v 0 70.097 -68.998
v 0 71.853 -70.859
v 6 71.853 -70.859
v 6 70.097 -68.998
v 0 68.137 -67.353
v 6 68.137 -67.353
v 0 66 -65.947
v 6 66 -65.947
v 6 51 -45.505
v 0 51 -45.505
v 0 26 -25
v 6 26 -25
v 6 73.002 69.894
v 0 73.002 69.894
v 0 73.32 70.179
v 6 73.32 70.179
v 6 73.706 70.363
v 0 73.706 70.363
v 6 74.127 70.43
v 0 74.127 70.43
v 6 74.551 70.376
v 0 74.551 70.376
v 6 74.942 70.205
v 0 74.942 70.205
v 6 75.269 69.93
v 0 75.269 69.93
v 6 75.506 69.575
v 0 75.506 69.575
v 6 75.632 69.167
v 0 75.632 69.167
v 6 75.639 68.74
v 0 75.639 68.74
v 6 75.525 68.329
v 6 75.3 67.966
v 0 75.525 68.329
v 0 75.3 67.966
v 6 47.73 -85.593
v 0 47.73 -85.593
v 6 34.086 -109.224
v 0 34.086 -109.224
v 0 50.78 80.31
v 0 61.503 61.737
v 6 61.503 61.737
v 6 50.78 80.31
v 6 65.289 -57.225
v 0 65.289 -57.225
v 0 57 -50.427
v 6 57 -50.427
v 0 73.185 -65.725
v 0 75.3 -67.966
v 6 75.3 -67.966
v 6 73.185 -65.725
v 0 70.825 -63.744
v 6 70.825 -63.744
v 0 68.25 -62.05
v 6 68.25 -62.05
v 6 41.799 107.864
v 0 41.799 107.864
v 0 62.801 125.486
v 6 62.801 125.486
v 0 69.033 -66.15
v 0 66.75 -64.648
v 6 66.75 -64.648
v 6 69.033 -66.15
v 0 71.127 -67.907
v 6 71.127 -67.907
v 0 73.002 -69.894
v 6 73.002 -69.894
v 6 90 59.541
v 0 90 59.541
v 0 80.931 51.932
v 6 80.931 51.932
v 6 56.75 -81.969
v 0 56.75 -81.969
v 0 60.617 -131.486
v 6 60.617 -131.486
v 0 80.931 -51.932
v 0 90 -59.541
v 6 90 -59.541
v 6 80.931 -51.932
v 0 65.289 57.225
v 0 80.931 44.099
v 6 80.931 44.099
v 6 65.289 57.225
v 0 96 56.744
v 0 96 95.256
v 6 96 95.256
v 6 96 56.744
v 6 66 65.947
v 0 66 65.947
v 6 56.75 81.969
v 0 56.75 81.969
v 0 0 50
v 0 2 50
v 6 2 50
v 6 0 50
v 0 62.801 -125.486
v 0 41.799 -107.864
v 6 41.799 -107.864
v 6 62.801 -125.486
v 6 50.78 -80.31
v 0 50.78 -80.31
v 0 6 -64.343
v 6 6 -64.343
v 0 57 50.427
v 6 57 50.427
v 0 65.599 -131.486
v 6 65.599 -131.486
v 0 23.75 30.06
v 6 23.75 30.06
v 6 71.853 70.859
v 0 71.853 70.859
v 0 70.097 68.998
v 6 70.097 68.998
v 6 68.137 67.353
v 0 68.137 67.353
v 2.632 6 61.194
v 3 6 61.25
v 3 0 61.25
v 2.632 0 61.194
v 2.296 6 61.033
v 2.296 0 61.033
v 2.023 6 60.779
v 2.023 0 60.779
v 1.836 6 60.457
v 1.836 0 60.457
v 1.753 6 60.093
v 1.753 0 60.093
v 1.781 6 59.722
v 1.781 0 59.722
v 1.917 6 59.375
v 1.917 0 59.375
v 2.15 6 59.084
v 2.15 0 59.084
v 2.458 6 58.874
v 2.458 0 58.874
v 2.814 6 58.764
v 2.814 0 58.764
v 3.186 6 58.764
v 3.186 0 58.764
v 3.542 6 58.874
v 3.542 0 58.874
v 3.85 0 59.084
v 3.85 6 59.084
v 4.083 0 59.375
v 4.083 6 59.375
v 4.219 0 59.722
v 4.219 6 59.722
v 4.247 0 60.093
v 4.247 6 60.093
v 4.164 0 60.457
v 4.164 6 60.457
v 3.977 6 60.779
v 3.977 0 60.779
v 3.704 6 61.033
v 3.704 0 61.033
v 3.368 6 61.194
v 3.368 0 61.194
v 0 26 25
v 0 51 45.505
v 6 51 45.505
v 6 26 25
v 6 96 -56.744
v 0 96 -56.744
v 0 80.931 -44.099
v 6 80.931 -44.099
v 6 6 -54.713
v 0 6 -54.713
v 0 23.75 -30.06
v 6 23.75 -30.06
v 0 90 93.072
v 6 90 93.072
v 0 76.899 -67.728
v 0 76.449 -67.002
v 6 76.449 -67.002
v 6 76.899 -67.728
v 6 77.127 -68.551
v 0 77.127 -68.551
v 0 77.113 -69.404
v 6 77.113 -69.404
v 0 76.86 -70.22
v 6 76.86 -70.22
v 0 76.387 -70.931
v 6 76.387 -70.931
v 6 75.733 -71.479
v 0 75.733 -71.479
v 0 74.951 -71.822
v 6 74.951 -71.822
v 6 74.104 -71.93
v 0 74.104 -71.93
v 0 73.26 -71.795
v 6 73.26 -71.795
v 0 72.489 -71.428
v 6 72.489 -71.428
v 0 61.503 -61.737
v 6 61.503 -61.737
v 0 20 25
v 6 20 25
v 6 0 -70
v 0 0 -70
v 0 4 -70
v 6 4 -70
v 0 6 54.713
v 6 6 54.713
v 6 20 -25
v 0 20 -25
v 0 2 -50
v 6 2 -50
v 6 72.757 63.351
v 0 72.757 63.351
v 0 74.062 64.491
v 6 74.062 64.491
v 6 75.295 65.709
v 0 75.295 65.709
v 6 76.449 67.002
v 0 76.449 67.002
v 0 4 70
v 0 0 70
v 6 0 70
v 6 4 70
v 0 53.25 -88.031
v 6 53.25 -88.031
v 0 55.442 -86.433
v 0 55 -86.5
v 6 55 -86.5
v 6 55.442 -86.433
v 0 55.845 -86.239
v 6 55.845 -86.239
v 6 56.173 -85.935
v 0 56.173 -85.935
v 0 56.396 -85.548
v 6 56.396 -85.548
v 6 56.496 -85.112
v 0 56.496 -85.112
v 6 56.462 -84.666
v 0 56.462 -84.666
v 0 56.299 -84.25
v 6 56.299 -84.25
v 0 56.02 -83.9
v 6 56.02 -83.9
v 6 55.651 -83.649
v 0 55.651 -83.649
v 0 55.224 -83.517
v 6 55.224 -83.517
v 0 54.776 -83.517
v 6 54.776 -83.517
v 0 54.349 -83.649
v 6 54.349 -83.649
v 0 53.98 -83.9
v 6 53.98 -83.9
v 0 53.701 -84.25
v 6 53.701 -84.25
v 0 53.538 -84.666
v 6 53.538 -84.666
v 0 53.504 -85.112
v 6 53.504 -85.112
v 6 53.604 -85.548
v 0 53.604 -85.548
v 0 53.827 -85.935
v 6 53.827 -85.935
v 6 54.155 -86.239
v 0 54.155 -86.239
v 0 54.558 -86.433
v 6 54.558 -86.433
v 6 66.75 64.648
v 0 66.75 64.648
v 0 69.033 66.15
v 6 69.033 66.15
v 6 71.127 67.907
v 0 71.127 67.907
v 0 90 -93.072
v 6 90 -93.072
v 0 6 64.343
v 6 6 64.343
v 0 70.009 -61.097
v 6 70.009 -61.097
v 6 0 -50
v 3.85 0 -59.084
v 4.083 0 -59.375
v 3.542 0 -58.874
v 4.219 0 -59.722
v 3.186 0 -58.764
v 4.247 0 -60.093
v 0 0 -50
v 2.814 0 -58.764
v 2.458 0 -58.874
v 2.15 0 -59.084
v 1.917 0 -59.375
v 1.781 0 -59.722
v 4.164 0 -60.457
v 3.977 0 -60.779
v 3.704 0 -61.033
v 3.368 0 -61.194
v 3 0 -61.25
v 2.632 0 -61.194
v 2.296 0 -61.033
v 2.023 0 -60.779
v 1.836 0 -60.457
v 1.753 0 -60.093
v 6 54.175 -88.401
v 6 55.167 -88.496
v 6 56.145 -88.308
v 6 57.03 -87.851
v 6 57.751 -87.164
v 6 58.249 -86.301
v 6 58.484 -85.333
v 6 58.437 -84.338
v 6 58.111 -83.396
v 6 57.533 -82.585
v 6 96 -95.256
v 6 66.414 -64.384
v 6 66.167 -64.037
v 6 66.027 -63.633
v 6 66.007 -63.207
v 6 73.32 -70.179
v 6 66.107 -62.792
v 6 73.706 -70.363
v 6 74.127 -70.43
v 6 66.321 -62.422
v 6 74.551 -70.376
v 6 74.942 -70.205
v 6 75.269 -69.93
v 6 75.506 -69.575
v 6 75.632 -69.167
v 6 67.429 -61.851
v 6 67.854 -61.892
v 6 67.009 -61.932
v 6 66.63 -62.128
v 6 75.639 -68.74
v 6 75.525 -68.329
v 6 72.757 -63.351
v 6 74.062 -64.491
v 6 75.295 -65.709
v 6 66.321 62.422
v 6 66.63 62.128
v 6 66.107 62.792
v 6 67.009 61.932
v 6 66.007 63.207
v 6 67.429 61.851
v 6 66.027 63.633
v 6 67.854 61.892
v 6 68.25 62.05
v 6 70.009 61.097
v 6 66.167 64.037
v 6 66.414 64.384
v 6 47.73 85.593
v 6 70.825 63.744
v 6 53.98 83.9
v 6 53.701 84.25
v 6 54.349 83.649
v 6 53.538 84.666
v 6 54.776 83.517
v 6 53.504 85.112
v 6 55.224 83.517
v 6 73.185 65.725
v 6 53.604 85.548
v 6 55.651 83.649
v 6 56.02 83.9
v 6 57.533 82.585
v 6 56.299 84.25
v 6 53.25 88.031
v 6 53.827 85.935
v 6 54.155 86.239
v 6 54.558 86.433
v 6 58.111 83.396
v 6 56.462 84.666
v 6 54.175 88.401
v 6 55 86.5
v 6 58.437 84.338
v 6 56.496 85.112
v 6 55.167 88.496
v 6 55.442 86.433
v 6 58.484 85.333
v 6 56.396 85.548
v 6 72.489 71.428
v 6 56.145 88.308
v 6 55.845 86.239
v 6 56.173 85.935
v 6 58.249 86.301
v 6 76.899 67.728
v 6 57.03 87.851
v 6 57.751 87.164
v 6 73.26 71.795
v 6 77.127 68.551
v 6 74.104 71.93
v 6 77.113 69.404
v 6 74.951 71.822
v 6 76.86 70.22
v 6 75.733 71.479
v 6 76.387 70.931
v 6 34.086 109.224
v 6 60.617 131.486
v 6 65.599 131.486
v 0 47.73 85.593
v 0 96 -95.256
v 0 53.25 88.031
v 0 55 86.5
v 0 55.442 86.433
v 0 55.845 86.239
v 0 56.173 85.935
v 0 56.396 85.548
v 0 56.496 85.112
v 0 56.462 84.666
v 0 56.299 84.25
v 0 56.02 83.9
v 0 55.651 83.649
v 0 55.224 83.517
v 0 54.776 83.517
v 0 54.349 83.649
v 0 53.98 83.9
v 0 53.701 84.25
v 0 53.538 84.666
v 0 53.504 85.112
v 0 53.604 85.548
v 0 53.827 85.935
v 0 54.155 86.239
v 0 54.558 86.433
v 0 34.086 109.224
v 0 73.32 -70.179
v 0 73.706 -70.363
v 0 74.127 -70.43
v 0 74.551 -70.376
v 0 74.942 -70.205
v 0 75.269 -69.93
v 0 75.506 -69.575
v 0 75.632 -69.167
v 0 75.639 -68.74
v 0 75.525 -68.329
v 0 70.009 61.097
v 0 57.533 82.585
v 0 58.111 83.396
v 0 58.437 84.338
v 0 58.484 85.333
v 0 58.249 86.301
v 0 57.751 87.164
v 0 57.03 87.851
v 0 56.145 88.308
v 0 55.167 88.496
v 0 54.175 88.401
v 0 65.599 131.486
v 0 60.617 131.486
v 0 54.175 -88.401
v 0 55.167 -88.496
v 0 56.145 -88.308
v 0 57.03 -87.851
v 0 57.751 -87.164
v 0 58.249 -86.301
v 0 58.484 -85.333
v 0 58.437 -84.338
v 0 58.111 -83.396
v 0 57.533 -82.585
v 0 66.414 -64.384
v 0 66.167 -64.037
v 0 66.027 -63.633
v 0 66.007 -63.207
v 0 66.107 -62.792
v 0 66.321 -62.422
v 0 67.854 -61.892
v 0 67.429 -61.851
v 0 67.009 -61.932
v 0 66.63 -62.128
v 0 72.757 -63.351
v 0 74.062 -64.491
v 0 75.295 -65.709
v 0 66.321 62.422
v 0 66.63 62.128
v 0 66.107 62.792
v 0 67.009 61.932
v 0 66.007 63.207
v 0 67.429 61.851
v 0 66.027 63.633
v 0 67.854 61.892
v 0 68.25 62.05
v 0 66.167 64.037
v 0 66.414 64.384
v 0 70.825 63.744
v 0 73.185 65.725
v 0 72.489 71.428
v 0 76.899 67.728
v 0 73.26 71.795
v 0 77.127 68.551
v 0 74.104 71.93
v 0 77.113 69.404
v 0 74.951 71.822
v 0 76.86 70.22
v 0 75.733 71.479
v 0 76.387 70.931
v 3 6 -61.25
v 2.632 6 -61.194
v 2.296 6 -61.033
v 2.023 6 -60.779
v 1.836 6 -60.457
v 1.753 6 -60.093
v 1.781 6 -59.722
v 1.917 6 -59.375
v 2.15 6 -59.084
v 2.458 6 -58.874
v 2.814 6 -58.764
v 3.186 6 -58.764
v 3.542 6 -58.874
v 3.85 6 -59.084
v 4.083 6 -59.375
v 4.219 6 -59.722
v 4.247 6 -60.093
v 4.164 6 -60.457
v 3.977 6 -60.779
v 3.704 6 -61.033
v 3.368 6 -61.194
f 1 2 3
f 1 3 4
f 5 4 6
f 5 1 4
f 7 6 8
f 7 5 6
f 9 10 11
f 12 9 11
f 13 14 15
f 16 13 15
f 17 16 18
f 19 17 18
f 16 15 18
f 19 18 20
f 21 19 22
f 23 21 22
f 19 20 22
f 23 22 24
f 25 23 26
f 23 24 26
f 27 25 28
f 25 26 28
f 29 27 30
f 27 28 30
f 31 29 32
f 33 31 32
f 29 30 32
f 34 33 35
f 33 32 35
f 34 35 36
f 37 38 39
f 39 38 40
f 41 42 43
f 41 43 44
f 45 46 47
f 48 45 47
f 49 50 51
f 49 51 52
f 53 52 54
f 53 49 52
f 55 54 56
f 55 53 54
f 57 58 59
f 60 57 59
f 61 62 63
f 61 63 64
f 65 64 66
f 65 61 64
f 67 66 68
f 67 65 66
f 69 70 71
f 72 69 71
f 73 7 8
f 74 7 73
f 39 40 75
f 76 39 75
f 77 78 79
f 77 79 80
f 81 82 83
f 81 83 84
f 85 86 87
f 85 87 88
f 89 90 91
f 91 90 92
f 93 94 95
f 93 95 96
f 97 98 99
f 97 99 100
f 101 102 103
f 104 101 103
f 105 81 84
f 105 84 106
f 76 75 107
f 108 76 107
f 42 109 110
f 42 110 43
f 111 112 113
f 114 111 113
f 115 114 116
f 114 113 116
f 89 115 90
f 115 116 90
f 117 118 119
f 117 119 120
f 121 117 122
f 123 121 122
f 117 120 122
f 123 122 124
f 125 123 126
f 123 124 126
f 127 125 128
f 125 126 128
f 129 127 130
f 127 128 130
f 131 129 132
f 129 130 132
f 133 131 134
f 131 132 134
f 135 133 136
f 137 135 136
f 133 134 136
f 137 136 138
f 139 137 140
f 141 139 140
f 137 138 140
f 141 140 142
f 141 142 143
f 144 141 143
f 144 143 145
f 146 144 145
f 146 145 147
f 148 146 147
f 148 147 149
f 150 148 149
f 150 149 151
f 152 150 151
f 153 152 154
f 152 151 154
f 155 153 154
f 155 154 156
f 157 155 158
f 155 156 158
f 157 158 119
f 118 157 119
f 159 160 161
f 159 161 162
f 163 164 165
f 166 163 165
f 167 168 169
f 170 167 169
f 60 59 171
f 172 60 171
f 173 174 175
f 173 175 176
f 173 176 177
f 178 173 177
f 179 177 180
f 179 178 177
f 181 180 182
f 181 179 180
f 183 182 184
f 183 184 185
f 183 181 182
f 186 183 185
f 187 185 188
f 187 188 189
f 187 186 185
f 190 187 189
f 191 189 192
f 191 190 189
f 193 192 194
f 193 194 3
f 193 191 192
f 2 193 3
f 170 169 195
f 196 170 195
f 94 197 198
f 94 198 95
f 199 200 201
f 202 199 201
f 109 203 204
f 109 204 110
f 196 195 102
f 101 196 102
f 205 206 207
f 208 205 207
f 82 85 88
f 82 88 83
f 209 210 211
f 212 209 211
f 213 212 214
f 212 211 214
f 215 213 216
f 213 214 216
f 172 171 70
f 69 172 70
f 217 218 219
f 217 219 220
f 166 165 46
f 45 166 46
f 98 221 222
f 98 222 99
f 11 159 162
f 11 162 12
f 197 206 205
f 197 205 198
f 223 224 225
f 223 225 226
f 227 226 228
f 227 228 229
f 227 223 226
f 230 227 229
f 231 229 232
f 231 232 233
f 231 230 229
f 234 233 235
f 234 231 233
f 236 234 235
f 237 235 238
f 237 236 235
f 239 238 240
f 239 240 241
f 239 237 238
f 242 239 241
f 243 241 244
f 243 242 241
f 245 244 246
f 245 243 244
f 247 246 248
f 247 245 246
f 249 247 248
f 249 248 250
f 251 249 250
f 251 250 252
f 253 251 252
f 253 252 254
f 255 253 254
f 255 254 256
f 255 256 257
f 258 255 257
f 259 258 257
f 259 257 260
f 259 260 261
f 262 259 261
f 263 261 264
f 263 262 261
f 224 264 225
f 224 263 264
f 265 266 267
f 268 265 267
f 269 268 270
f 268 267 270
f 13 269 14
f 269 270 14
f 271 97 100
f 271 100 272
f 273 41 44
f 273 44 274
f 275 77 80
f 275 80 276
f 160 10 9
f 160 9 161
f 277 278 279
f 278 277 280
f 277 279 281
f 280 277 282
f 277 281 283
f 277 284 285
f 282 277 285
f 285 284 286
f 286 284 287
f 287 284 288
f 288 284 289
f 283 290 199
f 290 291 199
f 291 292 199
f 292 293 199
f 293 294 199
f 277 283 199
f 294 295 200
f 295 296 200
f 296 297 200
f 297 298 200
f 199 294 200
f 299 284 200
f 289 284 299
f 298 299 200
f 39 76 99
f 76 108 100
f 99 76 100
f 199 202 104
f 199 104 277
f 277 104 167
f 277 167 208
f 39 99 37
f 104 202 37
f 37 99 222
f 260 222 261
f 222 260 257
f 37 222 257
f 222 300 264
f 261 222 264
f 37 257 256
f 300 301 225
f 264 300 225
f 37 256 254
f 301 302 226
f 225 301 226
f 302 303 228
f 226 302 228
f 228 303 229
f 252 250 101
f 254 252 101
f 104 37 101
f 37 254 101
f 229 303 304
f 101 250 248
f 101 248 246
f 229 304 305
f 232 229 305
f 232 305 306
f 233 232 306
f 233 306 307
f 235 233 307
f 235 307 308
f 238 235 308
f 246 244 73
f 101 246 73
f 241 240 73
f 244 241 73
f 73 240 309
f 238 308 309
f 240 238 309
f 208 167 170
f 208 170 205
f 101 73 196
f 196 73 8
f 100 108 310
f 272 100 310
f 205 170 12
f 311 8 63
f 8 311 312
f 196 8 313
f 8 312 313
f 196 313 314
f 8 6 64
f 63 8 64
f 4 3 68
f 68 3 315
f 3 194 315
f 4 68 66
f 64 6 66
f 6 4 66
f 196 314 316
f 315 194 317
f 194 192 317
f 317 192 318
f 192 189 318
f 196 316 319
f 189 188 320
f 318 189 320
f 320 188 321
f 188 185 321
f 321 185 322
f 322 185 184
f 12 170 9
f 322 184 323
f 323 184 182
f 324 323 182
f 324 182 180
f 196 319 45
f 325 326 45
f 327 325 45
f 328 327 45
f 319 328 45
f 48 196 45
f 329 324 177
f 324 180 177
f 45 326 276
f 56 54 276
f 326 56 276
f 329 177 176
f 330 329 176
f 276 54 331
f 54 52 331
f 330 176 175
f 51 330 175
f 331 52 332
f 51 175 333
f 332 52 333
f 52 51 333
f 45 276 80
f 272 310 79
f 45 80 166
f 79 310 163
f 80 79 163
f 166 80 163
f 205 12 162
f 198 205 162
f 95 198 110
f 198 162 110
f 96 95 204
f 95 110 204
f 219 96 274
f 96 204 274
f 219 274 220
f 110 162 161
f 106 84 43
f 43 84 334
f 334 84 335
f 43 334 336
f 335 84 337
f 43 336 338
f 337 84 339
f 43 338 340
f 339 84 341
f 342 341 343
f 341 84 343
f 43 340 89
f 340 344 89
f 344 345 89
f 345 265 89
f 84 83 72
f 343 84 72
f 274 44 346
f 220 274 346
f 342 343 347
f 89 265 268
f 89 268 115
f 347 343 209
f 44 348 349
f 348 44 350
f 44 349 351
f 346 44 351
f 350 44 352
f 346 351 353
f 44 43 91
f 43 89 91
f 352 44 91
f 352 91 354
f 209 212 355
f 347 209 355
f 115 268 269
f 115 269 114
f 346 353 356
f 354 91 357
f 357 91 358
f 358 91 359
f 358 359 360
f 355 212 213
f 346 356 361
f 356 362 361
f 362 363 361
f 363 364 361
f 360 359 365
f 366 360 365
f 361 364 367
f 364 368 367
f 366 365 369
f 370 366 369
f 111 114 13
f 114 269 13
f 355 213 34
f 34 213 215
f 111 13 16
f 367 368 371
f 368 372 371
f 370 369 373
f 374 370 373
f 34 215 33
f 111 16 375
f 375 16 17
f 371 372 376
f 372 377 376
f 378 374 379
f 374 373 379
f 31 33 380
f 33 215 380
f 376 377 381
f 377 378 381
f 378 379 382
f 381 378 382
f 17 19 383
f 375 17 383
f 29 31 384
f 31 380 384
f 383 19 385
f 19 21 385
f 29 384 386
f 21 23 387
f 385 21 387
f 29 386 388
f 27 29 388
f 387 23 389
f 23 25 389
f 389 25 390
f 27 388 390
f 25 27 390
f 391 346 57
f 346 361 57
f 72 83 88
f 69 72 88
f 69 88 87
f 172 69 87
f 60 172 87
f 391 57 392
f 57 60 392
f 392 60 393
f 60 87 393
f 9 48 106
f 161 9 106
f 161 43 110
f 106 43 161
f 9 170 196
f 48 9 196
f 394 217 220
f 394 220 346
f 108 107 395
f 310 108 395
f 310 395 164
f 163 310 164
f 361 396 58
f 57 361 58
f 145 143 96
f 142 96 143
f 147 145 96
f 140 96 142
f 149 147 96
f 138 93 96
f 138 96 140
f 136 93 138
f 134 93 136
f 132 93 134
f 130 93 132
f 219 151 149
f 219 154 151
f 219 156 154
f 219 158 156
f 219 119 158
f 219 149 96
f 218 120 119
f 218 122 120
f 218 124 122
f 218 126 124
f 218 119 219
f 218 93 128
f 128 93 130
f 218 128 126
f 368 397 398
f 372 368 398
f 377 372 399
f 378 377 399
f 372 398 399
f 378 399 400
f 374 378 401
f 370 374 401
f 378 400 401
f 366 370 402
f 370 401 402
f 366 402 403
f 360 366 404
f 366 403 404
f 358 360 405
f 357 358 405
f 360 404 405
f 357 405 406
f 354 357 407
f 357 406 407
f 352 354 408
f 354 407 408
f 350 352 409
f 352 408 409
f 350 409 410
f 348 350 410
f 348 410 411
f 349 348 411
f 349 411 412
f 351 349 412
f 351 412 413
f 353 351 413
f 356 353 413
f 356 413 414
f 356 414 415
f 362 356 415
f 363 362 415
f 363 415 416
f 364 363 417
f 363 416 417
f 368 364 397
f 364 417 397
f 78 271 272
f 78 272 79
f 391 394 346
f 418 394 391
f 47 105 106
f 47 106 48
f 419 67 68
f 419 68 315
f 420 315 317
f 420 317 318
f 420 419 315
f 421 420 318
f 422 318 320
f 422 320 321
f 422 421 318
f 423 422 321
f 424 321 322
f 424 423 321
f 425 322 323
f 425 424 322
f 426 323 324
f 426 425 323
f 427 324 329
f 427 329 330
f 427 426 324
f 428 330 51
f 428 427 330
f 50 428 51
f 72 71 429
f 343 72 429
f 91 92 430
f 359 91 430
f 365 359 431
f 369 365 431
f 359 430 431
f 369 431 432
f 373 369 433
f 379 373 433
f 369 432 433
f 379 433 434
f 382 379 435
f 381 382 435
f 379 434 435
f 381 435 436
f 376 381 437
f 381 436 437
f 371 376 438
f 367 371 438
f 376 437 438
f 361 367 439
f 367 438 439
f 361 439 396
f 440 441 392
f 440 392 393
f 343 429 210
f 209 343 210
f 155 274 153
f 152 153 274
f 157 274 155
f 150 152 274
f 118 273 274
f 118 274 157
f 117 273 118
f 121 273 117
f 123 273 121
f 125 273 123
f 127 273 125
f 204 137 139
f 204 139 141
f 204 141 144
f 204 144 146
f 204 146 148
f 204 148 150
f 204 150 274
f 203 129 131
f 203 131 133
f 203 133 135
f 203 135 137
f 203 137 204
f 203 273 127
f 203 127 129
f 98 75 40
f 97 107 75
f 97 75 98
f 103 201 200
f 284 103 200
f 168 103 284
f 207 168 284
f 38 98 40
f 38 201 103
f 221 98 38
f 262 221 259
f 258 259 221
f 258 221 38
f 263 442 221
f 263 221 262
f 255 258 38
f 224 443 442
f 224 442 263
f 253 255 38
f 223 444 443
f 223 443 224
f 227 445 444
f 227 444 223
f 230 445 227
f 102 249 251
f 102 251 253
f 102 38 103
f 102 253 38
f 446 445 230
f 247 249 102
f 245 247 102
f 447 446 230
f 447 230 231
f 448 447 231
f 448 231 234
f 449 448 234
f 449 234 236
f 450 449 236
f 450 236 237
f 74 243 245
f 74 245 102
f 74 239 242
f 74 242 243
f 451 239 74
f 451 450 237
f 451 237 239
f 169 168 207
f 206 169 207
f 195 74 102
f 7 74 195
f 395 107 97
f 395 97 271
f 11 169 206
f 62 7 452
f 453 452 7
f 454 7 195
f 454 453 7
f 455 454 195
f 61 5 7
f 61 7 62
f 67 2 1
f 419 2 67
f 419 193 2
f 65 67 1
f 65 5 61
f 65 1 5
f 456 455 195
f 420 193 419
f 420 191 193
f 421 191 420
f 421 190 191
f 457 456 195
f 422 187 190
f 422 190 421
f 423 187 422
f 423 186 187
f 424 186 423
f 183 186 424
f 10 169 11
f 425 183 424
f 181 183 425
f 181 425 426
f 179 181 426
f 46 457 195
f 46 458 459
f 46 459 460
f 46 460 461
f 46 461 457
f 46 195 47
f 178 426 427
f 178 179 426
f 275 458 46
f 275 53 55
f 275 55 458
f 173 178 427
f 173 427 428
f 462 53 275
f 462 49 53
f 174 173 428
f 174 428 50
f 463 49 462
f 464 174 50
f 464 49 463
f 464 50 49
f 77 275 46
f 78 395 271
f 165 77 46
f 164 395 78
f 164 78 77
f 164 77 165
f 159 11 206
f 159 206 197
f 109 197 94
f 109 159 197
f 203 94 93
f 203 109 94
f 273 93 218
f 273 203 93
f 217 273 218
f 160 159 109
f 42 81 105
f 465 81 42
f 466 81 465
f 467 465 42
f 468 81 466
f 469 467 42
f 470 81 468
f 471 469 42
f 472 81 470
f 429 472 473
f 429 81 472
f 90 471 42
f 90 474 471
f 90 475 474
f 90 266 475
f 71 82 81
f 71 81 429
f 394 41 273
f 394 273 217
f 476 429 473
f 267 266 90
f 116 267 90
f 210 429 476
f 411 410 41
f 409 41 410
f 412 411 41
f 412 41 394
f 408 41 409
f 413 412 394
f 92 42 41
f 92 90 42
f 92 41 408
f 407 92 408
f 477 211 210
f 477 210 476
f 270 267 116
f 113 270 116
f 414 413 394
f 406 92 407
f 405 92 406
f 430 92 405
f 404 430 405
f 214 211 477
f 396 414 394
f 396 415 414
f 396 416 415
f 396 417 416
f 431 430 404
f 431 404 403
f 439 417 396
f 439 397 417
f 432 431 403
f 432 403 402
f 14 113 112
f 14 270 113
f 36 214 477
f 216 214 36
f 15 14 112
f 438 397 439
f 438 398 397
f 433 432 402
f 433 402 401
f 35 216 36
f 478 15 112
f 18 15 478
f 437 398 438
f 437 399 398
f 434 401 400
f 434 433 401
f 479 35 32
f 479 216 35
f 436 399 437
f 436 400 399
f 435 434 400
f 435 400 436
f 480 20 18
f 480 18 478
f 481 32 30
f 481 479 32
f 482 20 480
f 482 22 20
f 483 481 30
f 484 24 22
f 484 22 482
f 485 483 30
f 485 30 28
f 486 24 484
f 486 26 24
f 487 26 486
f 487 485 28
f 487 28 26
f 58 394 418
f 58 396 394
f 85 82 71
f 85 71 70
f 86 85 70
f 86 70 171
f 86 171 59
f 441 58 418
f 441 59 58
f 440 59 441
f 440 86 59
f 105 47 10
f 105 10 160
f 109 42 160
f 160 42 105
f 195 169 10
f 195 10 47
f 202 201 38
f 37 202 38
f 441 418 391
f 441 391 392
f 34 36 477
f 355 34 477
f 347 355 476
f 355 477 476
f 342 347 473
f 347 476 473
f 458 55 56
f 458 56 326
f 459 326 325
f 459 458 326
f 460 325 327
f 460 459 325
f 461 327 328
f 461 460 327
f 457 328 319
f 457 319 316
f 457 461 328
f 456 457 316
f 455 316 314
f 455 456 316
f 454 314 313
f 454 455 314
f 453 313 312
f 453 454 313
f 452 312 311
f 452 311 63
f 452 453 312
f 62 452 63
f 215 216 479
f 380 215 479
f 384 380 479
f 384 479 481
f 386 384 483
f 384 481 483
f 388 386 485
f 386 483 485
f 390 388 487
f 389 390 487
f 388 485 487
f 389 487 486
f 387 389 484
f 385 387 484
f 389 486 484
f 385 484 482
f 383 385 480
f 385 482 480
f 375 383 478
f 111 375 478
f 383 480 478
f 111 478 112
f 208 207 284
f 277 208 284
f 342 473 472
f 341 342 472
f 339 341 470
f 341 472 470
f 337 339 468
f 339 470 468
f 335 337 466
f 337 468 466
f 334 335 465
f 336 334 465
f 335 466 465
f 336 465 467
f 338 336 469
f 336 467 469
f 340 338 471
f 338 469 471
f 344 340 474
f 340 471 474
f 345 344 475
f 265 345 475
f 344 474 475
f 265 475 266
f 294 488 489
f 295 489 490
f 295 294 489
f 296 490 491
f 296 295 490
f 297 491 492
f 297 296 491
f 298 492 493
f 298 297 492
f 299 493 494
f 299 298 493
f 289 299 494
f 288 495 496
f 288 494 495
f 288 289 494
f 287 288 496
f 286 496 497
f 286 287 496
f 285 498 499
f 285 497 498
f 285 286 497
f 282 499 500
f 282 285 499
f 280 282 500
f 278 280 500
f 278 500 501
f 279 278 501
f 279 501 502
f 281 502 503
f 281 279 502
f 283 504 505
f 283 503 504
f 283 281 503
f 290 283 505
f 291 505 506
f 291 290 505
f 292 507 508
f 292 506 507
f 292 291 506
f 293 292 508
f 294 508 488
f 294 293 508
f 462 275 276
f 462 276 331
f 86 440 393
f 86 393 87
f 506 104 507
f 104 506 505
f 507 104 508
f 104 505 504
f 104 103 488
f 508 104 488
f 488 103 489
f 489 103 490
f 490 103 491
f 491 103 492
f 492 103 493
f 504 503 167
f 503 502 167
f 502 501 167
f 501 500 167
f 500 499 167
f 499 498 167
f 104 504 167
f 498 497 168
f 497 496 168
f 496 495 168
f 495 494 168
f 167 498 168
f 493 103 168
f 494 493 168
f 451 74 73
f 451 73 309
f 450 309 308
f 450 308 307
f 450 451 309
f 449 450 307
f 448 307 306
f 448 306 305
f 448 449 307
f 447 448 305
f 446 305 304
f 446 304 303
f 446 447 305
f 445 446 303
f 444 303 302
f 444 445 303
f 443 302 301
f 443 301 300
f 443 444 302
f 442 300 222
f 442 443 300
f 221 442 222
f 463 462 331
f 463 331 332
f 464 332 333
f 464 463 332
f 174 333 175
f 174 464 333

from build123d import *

# Parameters (mm, degrees)
SKETCH1_R           = 1.5
BOSS_EXTRUDE1_DEPTH = 6


with BuildPart() as part:
    # Sketch1 → Boss-Extrude1 (new body)
    with BuildSketch(Plane(origin=(0, 0, 0), x_dir=(0, 0, -1), z_dir=(1, 0, 0))):
        Polygon((50, 0), (70, 0), (70, 4), (85.592625509, 47.729644272), (109.224105862, 34.086002729), (131.486359031, 60.617122922), (131.486359031, 65.598790277), (95.255608124, 96), (56.74353499, 96), (44.099407436, 80.931315562), (57.225143451, 65.28867251), (50.426653107, 57), (0, 57), (0, 51), (45.505365409, 51), (25, 26), (0, 26), (0, 20), (25, 20), (50, 2), align=None)
        with Locations((85, 55)):
            Circle(SKETCH1_R, mode=Mode.SUBTRACT)
        Polygon((30.059592338, 23.750495981), (61.737302817, 61.50252125), (80.310098668, 50.779512566), (64.343122912, 6), (54.713058978, 6), align=None, mode=Mode.SUBTRACT)
        with BuildLine():
            Line((59.541380939, 90), (51.931851172, 80.931315562))
            Line((51.931851172, 80.931315562), (61.09679395, 70.00896208))
            Line((61.09679395, 70.00896208), (63.350780176, 72.757006533))
            ThreePointArc((63.350780176, 72.757006533), (65.090587223, 74.687947655), (67.001946929, 76.449244407))
            ThreePointArc((67.001946929, 76.449244407), (71.228443087, 76.079473907), (70.858672587, 71.852977749))
            ThreePointArc((70.858672587, 71.852977749), (68.147022251, 69.141327413), (65.947441117, 66))
            Line((65.947441117, 66), (81.968911087, 56.75))
            ThreePointArc((81.968911087, 56.75), (86.75, 58.031088913), (88.031088913, 53.25))
            Line((88.031088913, 53.25), (107.864016281, 41.799454045))
            Line((107.864016281, 41.799454045), (125.486359031, 62.800944328))
            Line((125.486359031, 62.800944328), (93.071786719, 90))
            Line((93.071786719, 90), (59.541380939, 90))
        make_face(mode=Mode.SUBTRACT)
        with BuildLine():
            ThreePointArc((67.966128343, 75.300177743), (64.699822257, 72.033871657), (62.0503268, 68.25))
            ThreePointArc((62.0503268, 68.25), (62.599364905, 66.200961894), (64.648403011, 66.75))
            ThreePointArc((64.648403011, 66.75), (66.997955587, 70.105508828), (69.894491172, 73.002044413))
            ThreePointArc((69.894491172, 73.002044413), (70.079376423, 75.115292493), (67.966128343, 75.300177743))
        make_face(mode=Mode.SUBTRACT)
    boss_extrude1 = extrude(amount=BOSS_EXTRUDE1_DEPTH)

    # Sketch2 → Tap Drill for M3 Tap1 (revolve, cut)
    with BuildSketch(Plane(origin=(3, 0, -60), x_dir=(0, 0, -1), z_dir=(1, 0, 0))):
        Polygon((0, 0), (0, 10.751075774), (1.25, 10), (1.25, 0), align=None)
    tap_drill_for_m3_tap1 = revolve(axis=Axis((3, -6.35, -60), (0, 1, 0)), mode=Mode.SUBTRACT)

    # Mirror1: Boss-Extrude1, Tap Drill for M3 Tap1 across plane
    add(boss_extrude1.mirror(Plane.XY))
    add(tap_drill_for_m3_tap1.mirror(Plane.XY), mode=Mode.SUBTRACT)


solid = part.part
